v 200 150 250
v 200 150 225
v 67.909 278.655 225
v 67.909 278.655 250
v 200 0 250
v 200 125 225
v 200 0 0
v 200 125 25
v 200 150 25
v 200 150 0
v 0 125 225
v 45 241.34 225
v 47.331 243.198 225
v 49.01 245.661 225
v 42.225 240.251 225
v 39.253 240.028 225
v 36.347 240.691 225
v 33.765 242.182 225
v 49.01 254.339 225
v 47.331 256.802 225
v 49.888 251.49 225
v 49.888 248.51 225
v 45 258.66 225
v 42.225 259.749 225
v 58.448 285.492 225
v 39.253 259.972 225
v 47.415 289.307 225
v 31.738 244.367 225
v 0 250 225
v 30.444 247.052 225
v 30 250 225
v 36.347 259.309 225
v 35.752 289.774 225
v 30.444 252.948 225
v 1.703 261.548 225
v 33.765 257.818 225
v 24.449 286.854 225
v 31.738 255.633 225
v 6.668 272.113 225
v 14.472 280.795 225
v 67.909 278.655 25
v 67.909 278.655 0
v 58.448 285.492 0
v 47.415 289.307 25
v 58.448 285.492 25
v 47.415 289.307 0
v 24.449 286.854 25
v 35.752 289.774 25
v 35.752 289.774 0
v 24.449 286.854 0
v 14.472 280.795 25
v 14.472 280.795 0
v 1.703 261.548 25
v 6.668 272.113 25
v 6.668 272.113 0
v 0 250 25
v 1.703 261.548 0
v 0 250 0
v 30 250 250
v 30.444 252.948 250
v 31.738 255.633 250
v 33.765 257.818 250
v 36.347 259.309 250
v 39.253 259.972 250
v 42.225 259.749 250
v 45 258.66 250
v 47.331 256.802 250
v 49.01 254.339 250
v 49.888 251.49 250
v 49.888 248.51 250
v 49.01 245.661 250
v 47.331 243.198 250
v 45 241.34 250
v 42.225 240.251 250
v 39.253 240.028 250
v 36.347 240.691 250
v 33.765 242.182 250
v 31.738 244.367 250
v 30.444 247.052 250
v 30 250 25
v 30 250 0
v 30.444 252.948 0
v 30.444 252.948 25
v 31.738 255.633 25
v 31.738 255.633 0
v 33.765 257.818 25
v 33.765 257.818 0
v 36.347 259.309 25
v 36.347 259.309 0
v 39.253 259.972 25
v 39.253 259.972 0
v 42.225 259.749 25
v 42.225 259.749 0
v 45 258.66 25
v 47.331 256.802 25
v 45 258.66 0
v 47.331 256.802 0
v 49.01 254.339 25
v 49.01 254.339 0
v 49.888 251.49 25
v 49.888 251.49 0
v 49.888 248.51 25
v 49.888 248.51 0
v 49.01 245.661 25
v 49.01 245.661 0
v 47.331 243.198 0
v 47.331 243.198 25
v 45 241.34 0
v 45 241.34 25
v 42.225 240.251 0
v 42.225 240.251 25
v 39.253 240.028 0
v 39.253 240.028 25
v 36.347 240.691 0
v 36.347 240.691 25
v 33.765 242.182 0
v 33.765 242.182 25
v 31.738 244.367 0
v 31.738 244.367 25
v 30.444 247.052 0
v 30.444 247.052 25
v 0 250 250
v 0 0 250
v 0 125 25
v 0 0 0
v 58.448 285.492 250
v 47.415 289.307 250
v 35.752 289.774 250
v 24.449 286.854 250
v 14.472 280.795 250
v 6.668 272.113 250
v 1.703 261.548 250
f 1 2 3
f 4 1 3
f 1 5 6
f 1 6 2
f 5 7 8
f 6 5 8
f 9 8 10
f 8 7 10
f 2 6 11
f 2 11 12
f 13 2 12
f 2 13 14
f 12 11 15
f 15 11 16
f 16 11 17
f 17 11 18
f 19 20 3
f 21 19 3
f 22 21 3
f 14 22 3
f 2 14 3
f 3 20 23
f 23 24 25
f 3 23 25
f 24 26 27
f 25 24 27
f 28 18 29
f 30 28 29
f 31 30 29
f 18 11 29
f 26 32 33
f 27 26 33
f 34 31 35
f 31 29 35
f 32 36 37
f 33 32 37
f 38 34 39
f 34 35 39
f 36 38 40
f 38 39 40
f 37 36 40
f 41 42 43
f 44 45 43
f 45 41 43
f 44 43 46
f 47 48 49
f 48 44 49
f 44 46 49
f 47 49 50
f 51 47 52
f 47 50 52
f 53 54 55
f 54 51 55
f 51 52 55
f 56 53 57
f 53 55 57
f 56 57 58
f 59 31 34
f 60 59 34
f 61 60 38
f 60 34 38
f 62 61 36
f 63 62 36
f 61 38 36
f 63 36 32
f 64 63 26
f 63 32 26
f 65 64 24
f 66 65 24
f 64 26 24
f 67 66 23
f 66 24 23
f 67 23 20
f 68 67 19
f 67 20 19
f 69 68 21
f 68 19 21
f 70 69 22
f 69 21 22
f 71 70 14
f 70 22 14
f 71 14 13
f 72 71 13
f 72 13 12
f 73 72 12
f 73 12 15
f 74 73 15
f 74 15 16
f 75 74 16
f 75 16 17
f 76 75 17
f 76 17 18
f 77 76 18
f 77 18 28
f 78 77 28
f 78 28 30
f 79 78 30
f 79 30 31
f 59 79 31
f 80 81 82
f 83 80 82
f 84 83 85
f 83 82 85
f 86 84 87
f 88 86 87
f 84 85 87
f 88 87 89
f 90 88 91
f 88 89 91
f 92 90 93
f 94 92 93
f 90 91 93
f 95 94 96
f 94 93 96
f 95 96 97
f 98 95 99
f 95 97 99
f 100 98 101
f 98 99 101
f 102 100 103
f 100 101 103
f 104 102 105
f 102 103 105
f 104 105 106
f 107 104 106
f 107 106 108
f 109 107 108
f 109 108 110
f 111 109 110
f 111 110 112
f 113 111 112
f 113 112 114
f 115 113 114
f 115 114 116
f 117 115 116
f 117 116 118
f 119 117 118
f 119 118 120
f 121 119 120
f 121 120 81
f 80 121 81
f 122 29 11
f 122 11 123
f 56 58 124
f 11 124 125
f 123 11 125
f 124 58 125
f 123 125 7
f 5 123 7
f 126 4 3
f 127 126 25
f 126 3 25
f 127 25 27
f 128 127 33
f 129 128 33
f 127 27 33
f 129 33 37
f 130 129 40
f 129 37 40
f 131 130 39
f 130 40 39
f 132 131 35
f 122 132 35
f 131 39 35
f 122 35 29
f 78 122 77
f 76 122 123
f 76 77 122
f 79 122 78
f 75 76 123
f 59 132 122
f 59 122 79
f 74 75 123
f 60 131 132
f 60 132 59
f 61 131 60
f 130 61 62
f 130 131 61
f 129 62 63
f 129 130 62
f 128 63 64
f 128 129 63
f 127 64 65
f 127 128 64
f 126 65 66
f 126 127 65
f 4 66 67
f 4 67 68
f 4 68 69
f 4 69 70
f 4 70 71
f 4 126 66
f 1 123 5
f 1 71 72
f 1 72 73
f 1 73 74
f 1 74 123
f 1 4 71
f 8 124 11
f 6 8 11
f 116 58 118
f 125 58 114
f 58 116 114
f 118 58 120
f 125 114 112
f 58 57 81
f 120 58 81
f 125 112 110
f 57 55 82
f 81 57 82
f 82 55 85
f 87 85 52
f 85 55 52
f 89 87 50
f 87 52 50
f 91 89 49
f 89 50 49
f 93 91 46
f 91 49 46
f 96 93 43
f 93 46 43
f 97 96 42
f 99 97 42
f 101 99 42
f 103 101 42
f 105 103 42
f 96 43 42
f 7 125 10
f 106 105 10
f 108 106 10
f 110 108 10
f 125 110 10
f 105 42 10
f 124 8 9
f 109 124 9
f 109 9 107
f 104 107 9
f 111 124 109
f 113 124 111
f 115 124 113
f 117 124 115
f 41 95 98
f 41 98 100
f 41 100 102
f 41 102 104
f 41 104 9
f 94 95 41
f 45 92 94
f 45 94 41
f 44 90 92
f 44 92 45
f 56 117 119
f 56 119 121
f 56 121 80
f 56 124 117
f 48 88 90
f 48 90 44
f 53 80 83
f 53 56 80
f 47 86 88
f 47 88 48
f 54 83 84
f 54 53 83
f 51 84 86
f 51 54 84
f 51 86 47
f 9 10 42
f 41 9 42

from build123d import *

# Parameters (mm, degrees)
SALIENTE_EXTRUIR3_DEPTH = 250
CROQUIS6_R              = 10
CORTAR_EXTRUIR1_DEPTH   = 264
CROQUIS7_W              = 200
CROQUIS7_H              = 165
CORTAR_EXTRUIR3_DEPTH   = 264


with BuildPart() as part:
    # Croquis3 → Saliente-Extruir3 (new body)
    with BuildSketch(Plane.XY):
        with BuildLine():
            Line((200, 150), (67.909088668, 278.654541869))
            ThreePointArc((67.909088668, 278.654541869), (24.449494329, 286.853517788), (0, 250))
            Line((0, 250), (0, 150))
            Line((0, 150), (0, 0))
            Line((0, 0), (200, 0))
            Line((200, 0), (200, 150))
        make_face()
    extrude(amount=SALIENTE_EXTRUIR3_DEPTH)

    # Croquis6 → Cortar-Extruir1 (cut)
    with BuildSketch(Plane(origin=(0, 0, 0), x_dir=(-1, 0, 0), z_dir=(0, 0, -1))):
        with Locations((-40, 250)):
            Circle(CROQUIS6_R)
    extrude(amount=-CORTAR_EXTRUIR1_DEPTH, mode=Mode.SUBTRACT)

    # Croquis7 → Cortar-Extruir3 (cut)
    with BuildSketch(Plane.ZY):
        with Locations((125, 207.5)):
            Rectangle(CROQUIS7_W, CROQUIS7_H)
    extrude(amount=-CORTAR_EXTRUIR3_DEPTH, mode=Mode.SUBTRACT)


solid = part.part
